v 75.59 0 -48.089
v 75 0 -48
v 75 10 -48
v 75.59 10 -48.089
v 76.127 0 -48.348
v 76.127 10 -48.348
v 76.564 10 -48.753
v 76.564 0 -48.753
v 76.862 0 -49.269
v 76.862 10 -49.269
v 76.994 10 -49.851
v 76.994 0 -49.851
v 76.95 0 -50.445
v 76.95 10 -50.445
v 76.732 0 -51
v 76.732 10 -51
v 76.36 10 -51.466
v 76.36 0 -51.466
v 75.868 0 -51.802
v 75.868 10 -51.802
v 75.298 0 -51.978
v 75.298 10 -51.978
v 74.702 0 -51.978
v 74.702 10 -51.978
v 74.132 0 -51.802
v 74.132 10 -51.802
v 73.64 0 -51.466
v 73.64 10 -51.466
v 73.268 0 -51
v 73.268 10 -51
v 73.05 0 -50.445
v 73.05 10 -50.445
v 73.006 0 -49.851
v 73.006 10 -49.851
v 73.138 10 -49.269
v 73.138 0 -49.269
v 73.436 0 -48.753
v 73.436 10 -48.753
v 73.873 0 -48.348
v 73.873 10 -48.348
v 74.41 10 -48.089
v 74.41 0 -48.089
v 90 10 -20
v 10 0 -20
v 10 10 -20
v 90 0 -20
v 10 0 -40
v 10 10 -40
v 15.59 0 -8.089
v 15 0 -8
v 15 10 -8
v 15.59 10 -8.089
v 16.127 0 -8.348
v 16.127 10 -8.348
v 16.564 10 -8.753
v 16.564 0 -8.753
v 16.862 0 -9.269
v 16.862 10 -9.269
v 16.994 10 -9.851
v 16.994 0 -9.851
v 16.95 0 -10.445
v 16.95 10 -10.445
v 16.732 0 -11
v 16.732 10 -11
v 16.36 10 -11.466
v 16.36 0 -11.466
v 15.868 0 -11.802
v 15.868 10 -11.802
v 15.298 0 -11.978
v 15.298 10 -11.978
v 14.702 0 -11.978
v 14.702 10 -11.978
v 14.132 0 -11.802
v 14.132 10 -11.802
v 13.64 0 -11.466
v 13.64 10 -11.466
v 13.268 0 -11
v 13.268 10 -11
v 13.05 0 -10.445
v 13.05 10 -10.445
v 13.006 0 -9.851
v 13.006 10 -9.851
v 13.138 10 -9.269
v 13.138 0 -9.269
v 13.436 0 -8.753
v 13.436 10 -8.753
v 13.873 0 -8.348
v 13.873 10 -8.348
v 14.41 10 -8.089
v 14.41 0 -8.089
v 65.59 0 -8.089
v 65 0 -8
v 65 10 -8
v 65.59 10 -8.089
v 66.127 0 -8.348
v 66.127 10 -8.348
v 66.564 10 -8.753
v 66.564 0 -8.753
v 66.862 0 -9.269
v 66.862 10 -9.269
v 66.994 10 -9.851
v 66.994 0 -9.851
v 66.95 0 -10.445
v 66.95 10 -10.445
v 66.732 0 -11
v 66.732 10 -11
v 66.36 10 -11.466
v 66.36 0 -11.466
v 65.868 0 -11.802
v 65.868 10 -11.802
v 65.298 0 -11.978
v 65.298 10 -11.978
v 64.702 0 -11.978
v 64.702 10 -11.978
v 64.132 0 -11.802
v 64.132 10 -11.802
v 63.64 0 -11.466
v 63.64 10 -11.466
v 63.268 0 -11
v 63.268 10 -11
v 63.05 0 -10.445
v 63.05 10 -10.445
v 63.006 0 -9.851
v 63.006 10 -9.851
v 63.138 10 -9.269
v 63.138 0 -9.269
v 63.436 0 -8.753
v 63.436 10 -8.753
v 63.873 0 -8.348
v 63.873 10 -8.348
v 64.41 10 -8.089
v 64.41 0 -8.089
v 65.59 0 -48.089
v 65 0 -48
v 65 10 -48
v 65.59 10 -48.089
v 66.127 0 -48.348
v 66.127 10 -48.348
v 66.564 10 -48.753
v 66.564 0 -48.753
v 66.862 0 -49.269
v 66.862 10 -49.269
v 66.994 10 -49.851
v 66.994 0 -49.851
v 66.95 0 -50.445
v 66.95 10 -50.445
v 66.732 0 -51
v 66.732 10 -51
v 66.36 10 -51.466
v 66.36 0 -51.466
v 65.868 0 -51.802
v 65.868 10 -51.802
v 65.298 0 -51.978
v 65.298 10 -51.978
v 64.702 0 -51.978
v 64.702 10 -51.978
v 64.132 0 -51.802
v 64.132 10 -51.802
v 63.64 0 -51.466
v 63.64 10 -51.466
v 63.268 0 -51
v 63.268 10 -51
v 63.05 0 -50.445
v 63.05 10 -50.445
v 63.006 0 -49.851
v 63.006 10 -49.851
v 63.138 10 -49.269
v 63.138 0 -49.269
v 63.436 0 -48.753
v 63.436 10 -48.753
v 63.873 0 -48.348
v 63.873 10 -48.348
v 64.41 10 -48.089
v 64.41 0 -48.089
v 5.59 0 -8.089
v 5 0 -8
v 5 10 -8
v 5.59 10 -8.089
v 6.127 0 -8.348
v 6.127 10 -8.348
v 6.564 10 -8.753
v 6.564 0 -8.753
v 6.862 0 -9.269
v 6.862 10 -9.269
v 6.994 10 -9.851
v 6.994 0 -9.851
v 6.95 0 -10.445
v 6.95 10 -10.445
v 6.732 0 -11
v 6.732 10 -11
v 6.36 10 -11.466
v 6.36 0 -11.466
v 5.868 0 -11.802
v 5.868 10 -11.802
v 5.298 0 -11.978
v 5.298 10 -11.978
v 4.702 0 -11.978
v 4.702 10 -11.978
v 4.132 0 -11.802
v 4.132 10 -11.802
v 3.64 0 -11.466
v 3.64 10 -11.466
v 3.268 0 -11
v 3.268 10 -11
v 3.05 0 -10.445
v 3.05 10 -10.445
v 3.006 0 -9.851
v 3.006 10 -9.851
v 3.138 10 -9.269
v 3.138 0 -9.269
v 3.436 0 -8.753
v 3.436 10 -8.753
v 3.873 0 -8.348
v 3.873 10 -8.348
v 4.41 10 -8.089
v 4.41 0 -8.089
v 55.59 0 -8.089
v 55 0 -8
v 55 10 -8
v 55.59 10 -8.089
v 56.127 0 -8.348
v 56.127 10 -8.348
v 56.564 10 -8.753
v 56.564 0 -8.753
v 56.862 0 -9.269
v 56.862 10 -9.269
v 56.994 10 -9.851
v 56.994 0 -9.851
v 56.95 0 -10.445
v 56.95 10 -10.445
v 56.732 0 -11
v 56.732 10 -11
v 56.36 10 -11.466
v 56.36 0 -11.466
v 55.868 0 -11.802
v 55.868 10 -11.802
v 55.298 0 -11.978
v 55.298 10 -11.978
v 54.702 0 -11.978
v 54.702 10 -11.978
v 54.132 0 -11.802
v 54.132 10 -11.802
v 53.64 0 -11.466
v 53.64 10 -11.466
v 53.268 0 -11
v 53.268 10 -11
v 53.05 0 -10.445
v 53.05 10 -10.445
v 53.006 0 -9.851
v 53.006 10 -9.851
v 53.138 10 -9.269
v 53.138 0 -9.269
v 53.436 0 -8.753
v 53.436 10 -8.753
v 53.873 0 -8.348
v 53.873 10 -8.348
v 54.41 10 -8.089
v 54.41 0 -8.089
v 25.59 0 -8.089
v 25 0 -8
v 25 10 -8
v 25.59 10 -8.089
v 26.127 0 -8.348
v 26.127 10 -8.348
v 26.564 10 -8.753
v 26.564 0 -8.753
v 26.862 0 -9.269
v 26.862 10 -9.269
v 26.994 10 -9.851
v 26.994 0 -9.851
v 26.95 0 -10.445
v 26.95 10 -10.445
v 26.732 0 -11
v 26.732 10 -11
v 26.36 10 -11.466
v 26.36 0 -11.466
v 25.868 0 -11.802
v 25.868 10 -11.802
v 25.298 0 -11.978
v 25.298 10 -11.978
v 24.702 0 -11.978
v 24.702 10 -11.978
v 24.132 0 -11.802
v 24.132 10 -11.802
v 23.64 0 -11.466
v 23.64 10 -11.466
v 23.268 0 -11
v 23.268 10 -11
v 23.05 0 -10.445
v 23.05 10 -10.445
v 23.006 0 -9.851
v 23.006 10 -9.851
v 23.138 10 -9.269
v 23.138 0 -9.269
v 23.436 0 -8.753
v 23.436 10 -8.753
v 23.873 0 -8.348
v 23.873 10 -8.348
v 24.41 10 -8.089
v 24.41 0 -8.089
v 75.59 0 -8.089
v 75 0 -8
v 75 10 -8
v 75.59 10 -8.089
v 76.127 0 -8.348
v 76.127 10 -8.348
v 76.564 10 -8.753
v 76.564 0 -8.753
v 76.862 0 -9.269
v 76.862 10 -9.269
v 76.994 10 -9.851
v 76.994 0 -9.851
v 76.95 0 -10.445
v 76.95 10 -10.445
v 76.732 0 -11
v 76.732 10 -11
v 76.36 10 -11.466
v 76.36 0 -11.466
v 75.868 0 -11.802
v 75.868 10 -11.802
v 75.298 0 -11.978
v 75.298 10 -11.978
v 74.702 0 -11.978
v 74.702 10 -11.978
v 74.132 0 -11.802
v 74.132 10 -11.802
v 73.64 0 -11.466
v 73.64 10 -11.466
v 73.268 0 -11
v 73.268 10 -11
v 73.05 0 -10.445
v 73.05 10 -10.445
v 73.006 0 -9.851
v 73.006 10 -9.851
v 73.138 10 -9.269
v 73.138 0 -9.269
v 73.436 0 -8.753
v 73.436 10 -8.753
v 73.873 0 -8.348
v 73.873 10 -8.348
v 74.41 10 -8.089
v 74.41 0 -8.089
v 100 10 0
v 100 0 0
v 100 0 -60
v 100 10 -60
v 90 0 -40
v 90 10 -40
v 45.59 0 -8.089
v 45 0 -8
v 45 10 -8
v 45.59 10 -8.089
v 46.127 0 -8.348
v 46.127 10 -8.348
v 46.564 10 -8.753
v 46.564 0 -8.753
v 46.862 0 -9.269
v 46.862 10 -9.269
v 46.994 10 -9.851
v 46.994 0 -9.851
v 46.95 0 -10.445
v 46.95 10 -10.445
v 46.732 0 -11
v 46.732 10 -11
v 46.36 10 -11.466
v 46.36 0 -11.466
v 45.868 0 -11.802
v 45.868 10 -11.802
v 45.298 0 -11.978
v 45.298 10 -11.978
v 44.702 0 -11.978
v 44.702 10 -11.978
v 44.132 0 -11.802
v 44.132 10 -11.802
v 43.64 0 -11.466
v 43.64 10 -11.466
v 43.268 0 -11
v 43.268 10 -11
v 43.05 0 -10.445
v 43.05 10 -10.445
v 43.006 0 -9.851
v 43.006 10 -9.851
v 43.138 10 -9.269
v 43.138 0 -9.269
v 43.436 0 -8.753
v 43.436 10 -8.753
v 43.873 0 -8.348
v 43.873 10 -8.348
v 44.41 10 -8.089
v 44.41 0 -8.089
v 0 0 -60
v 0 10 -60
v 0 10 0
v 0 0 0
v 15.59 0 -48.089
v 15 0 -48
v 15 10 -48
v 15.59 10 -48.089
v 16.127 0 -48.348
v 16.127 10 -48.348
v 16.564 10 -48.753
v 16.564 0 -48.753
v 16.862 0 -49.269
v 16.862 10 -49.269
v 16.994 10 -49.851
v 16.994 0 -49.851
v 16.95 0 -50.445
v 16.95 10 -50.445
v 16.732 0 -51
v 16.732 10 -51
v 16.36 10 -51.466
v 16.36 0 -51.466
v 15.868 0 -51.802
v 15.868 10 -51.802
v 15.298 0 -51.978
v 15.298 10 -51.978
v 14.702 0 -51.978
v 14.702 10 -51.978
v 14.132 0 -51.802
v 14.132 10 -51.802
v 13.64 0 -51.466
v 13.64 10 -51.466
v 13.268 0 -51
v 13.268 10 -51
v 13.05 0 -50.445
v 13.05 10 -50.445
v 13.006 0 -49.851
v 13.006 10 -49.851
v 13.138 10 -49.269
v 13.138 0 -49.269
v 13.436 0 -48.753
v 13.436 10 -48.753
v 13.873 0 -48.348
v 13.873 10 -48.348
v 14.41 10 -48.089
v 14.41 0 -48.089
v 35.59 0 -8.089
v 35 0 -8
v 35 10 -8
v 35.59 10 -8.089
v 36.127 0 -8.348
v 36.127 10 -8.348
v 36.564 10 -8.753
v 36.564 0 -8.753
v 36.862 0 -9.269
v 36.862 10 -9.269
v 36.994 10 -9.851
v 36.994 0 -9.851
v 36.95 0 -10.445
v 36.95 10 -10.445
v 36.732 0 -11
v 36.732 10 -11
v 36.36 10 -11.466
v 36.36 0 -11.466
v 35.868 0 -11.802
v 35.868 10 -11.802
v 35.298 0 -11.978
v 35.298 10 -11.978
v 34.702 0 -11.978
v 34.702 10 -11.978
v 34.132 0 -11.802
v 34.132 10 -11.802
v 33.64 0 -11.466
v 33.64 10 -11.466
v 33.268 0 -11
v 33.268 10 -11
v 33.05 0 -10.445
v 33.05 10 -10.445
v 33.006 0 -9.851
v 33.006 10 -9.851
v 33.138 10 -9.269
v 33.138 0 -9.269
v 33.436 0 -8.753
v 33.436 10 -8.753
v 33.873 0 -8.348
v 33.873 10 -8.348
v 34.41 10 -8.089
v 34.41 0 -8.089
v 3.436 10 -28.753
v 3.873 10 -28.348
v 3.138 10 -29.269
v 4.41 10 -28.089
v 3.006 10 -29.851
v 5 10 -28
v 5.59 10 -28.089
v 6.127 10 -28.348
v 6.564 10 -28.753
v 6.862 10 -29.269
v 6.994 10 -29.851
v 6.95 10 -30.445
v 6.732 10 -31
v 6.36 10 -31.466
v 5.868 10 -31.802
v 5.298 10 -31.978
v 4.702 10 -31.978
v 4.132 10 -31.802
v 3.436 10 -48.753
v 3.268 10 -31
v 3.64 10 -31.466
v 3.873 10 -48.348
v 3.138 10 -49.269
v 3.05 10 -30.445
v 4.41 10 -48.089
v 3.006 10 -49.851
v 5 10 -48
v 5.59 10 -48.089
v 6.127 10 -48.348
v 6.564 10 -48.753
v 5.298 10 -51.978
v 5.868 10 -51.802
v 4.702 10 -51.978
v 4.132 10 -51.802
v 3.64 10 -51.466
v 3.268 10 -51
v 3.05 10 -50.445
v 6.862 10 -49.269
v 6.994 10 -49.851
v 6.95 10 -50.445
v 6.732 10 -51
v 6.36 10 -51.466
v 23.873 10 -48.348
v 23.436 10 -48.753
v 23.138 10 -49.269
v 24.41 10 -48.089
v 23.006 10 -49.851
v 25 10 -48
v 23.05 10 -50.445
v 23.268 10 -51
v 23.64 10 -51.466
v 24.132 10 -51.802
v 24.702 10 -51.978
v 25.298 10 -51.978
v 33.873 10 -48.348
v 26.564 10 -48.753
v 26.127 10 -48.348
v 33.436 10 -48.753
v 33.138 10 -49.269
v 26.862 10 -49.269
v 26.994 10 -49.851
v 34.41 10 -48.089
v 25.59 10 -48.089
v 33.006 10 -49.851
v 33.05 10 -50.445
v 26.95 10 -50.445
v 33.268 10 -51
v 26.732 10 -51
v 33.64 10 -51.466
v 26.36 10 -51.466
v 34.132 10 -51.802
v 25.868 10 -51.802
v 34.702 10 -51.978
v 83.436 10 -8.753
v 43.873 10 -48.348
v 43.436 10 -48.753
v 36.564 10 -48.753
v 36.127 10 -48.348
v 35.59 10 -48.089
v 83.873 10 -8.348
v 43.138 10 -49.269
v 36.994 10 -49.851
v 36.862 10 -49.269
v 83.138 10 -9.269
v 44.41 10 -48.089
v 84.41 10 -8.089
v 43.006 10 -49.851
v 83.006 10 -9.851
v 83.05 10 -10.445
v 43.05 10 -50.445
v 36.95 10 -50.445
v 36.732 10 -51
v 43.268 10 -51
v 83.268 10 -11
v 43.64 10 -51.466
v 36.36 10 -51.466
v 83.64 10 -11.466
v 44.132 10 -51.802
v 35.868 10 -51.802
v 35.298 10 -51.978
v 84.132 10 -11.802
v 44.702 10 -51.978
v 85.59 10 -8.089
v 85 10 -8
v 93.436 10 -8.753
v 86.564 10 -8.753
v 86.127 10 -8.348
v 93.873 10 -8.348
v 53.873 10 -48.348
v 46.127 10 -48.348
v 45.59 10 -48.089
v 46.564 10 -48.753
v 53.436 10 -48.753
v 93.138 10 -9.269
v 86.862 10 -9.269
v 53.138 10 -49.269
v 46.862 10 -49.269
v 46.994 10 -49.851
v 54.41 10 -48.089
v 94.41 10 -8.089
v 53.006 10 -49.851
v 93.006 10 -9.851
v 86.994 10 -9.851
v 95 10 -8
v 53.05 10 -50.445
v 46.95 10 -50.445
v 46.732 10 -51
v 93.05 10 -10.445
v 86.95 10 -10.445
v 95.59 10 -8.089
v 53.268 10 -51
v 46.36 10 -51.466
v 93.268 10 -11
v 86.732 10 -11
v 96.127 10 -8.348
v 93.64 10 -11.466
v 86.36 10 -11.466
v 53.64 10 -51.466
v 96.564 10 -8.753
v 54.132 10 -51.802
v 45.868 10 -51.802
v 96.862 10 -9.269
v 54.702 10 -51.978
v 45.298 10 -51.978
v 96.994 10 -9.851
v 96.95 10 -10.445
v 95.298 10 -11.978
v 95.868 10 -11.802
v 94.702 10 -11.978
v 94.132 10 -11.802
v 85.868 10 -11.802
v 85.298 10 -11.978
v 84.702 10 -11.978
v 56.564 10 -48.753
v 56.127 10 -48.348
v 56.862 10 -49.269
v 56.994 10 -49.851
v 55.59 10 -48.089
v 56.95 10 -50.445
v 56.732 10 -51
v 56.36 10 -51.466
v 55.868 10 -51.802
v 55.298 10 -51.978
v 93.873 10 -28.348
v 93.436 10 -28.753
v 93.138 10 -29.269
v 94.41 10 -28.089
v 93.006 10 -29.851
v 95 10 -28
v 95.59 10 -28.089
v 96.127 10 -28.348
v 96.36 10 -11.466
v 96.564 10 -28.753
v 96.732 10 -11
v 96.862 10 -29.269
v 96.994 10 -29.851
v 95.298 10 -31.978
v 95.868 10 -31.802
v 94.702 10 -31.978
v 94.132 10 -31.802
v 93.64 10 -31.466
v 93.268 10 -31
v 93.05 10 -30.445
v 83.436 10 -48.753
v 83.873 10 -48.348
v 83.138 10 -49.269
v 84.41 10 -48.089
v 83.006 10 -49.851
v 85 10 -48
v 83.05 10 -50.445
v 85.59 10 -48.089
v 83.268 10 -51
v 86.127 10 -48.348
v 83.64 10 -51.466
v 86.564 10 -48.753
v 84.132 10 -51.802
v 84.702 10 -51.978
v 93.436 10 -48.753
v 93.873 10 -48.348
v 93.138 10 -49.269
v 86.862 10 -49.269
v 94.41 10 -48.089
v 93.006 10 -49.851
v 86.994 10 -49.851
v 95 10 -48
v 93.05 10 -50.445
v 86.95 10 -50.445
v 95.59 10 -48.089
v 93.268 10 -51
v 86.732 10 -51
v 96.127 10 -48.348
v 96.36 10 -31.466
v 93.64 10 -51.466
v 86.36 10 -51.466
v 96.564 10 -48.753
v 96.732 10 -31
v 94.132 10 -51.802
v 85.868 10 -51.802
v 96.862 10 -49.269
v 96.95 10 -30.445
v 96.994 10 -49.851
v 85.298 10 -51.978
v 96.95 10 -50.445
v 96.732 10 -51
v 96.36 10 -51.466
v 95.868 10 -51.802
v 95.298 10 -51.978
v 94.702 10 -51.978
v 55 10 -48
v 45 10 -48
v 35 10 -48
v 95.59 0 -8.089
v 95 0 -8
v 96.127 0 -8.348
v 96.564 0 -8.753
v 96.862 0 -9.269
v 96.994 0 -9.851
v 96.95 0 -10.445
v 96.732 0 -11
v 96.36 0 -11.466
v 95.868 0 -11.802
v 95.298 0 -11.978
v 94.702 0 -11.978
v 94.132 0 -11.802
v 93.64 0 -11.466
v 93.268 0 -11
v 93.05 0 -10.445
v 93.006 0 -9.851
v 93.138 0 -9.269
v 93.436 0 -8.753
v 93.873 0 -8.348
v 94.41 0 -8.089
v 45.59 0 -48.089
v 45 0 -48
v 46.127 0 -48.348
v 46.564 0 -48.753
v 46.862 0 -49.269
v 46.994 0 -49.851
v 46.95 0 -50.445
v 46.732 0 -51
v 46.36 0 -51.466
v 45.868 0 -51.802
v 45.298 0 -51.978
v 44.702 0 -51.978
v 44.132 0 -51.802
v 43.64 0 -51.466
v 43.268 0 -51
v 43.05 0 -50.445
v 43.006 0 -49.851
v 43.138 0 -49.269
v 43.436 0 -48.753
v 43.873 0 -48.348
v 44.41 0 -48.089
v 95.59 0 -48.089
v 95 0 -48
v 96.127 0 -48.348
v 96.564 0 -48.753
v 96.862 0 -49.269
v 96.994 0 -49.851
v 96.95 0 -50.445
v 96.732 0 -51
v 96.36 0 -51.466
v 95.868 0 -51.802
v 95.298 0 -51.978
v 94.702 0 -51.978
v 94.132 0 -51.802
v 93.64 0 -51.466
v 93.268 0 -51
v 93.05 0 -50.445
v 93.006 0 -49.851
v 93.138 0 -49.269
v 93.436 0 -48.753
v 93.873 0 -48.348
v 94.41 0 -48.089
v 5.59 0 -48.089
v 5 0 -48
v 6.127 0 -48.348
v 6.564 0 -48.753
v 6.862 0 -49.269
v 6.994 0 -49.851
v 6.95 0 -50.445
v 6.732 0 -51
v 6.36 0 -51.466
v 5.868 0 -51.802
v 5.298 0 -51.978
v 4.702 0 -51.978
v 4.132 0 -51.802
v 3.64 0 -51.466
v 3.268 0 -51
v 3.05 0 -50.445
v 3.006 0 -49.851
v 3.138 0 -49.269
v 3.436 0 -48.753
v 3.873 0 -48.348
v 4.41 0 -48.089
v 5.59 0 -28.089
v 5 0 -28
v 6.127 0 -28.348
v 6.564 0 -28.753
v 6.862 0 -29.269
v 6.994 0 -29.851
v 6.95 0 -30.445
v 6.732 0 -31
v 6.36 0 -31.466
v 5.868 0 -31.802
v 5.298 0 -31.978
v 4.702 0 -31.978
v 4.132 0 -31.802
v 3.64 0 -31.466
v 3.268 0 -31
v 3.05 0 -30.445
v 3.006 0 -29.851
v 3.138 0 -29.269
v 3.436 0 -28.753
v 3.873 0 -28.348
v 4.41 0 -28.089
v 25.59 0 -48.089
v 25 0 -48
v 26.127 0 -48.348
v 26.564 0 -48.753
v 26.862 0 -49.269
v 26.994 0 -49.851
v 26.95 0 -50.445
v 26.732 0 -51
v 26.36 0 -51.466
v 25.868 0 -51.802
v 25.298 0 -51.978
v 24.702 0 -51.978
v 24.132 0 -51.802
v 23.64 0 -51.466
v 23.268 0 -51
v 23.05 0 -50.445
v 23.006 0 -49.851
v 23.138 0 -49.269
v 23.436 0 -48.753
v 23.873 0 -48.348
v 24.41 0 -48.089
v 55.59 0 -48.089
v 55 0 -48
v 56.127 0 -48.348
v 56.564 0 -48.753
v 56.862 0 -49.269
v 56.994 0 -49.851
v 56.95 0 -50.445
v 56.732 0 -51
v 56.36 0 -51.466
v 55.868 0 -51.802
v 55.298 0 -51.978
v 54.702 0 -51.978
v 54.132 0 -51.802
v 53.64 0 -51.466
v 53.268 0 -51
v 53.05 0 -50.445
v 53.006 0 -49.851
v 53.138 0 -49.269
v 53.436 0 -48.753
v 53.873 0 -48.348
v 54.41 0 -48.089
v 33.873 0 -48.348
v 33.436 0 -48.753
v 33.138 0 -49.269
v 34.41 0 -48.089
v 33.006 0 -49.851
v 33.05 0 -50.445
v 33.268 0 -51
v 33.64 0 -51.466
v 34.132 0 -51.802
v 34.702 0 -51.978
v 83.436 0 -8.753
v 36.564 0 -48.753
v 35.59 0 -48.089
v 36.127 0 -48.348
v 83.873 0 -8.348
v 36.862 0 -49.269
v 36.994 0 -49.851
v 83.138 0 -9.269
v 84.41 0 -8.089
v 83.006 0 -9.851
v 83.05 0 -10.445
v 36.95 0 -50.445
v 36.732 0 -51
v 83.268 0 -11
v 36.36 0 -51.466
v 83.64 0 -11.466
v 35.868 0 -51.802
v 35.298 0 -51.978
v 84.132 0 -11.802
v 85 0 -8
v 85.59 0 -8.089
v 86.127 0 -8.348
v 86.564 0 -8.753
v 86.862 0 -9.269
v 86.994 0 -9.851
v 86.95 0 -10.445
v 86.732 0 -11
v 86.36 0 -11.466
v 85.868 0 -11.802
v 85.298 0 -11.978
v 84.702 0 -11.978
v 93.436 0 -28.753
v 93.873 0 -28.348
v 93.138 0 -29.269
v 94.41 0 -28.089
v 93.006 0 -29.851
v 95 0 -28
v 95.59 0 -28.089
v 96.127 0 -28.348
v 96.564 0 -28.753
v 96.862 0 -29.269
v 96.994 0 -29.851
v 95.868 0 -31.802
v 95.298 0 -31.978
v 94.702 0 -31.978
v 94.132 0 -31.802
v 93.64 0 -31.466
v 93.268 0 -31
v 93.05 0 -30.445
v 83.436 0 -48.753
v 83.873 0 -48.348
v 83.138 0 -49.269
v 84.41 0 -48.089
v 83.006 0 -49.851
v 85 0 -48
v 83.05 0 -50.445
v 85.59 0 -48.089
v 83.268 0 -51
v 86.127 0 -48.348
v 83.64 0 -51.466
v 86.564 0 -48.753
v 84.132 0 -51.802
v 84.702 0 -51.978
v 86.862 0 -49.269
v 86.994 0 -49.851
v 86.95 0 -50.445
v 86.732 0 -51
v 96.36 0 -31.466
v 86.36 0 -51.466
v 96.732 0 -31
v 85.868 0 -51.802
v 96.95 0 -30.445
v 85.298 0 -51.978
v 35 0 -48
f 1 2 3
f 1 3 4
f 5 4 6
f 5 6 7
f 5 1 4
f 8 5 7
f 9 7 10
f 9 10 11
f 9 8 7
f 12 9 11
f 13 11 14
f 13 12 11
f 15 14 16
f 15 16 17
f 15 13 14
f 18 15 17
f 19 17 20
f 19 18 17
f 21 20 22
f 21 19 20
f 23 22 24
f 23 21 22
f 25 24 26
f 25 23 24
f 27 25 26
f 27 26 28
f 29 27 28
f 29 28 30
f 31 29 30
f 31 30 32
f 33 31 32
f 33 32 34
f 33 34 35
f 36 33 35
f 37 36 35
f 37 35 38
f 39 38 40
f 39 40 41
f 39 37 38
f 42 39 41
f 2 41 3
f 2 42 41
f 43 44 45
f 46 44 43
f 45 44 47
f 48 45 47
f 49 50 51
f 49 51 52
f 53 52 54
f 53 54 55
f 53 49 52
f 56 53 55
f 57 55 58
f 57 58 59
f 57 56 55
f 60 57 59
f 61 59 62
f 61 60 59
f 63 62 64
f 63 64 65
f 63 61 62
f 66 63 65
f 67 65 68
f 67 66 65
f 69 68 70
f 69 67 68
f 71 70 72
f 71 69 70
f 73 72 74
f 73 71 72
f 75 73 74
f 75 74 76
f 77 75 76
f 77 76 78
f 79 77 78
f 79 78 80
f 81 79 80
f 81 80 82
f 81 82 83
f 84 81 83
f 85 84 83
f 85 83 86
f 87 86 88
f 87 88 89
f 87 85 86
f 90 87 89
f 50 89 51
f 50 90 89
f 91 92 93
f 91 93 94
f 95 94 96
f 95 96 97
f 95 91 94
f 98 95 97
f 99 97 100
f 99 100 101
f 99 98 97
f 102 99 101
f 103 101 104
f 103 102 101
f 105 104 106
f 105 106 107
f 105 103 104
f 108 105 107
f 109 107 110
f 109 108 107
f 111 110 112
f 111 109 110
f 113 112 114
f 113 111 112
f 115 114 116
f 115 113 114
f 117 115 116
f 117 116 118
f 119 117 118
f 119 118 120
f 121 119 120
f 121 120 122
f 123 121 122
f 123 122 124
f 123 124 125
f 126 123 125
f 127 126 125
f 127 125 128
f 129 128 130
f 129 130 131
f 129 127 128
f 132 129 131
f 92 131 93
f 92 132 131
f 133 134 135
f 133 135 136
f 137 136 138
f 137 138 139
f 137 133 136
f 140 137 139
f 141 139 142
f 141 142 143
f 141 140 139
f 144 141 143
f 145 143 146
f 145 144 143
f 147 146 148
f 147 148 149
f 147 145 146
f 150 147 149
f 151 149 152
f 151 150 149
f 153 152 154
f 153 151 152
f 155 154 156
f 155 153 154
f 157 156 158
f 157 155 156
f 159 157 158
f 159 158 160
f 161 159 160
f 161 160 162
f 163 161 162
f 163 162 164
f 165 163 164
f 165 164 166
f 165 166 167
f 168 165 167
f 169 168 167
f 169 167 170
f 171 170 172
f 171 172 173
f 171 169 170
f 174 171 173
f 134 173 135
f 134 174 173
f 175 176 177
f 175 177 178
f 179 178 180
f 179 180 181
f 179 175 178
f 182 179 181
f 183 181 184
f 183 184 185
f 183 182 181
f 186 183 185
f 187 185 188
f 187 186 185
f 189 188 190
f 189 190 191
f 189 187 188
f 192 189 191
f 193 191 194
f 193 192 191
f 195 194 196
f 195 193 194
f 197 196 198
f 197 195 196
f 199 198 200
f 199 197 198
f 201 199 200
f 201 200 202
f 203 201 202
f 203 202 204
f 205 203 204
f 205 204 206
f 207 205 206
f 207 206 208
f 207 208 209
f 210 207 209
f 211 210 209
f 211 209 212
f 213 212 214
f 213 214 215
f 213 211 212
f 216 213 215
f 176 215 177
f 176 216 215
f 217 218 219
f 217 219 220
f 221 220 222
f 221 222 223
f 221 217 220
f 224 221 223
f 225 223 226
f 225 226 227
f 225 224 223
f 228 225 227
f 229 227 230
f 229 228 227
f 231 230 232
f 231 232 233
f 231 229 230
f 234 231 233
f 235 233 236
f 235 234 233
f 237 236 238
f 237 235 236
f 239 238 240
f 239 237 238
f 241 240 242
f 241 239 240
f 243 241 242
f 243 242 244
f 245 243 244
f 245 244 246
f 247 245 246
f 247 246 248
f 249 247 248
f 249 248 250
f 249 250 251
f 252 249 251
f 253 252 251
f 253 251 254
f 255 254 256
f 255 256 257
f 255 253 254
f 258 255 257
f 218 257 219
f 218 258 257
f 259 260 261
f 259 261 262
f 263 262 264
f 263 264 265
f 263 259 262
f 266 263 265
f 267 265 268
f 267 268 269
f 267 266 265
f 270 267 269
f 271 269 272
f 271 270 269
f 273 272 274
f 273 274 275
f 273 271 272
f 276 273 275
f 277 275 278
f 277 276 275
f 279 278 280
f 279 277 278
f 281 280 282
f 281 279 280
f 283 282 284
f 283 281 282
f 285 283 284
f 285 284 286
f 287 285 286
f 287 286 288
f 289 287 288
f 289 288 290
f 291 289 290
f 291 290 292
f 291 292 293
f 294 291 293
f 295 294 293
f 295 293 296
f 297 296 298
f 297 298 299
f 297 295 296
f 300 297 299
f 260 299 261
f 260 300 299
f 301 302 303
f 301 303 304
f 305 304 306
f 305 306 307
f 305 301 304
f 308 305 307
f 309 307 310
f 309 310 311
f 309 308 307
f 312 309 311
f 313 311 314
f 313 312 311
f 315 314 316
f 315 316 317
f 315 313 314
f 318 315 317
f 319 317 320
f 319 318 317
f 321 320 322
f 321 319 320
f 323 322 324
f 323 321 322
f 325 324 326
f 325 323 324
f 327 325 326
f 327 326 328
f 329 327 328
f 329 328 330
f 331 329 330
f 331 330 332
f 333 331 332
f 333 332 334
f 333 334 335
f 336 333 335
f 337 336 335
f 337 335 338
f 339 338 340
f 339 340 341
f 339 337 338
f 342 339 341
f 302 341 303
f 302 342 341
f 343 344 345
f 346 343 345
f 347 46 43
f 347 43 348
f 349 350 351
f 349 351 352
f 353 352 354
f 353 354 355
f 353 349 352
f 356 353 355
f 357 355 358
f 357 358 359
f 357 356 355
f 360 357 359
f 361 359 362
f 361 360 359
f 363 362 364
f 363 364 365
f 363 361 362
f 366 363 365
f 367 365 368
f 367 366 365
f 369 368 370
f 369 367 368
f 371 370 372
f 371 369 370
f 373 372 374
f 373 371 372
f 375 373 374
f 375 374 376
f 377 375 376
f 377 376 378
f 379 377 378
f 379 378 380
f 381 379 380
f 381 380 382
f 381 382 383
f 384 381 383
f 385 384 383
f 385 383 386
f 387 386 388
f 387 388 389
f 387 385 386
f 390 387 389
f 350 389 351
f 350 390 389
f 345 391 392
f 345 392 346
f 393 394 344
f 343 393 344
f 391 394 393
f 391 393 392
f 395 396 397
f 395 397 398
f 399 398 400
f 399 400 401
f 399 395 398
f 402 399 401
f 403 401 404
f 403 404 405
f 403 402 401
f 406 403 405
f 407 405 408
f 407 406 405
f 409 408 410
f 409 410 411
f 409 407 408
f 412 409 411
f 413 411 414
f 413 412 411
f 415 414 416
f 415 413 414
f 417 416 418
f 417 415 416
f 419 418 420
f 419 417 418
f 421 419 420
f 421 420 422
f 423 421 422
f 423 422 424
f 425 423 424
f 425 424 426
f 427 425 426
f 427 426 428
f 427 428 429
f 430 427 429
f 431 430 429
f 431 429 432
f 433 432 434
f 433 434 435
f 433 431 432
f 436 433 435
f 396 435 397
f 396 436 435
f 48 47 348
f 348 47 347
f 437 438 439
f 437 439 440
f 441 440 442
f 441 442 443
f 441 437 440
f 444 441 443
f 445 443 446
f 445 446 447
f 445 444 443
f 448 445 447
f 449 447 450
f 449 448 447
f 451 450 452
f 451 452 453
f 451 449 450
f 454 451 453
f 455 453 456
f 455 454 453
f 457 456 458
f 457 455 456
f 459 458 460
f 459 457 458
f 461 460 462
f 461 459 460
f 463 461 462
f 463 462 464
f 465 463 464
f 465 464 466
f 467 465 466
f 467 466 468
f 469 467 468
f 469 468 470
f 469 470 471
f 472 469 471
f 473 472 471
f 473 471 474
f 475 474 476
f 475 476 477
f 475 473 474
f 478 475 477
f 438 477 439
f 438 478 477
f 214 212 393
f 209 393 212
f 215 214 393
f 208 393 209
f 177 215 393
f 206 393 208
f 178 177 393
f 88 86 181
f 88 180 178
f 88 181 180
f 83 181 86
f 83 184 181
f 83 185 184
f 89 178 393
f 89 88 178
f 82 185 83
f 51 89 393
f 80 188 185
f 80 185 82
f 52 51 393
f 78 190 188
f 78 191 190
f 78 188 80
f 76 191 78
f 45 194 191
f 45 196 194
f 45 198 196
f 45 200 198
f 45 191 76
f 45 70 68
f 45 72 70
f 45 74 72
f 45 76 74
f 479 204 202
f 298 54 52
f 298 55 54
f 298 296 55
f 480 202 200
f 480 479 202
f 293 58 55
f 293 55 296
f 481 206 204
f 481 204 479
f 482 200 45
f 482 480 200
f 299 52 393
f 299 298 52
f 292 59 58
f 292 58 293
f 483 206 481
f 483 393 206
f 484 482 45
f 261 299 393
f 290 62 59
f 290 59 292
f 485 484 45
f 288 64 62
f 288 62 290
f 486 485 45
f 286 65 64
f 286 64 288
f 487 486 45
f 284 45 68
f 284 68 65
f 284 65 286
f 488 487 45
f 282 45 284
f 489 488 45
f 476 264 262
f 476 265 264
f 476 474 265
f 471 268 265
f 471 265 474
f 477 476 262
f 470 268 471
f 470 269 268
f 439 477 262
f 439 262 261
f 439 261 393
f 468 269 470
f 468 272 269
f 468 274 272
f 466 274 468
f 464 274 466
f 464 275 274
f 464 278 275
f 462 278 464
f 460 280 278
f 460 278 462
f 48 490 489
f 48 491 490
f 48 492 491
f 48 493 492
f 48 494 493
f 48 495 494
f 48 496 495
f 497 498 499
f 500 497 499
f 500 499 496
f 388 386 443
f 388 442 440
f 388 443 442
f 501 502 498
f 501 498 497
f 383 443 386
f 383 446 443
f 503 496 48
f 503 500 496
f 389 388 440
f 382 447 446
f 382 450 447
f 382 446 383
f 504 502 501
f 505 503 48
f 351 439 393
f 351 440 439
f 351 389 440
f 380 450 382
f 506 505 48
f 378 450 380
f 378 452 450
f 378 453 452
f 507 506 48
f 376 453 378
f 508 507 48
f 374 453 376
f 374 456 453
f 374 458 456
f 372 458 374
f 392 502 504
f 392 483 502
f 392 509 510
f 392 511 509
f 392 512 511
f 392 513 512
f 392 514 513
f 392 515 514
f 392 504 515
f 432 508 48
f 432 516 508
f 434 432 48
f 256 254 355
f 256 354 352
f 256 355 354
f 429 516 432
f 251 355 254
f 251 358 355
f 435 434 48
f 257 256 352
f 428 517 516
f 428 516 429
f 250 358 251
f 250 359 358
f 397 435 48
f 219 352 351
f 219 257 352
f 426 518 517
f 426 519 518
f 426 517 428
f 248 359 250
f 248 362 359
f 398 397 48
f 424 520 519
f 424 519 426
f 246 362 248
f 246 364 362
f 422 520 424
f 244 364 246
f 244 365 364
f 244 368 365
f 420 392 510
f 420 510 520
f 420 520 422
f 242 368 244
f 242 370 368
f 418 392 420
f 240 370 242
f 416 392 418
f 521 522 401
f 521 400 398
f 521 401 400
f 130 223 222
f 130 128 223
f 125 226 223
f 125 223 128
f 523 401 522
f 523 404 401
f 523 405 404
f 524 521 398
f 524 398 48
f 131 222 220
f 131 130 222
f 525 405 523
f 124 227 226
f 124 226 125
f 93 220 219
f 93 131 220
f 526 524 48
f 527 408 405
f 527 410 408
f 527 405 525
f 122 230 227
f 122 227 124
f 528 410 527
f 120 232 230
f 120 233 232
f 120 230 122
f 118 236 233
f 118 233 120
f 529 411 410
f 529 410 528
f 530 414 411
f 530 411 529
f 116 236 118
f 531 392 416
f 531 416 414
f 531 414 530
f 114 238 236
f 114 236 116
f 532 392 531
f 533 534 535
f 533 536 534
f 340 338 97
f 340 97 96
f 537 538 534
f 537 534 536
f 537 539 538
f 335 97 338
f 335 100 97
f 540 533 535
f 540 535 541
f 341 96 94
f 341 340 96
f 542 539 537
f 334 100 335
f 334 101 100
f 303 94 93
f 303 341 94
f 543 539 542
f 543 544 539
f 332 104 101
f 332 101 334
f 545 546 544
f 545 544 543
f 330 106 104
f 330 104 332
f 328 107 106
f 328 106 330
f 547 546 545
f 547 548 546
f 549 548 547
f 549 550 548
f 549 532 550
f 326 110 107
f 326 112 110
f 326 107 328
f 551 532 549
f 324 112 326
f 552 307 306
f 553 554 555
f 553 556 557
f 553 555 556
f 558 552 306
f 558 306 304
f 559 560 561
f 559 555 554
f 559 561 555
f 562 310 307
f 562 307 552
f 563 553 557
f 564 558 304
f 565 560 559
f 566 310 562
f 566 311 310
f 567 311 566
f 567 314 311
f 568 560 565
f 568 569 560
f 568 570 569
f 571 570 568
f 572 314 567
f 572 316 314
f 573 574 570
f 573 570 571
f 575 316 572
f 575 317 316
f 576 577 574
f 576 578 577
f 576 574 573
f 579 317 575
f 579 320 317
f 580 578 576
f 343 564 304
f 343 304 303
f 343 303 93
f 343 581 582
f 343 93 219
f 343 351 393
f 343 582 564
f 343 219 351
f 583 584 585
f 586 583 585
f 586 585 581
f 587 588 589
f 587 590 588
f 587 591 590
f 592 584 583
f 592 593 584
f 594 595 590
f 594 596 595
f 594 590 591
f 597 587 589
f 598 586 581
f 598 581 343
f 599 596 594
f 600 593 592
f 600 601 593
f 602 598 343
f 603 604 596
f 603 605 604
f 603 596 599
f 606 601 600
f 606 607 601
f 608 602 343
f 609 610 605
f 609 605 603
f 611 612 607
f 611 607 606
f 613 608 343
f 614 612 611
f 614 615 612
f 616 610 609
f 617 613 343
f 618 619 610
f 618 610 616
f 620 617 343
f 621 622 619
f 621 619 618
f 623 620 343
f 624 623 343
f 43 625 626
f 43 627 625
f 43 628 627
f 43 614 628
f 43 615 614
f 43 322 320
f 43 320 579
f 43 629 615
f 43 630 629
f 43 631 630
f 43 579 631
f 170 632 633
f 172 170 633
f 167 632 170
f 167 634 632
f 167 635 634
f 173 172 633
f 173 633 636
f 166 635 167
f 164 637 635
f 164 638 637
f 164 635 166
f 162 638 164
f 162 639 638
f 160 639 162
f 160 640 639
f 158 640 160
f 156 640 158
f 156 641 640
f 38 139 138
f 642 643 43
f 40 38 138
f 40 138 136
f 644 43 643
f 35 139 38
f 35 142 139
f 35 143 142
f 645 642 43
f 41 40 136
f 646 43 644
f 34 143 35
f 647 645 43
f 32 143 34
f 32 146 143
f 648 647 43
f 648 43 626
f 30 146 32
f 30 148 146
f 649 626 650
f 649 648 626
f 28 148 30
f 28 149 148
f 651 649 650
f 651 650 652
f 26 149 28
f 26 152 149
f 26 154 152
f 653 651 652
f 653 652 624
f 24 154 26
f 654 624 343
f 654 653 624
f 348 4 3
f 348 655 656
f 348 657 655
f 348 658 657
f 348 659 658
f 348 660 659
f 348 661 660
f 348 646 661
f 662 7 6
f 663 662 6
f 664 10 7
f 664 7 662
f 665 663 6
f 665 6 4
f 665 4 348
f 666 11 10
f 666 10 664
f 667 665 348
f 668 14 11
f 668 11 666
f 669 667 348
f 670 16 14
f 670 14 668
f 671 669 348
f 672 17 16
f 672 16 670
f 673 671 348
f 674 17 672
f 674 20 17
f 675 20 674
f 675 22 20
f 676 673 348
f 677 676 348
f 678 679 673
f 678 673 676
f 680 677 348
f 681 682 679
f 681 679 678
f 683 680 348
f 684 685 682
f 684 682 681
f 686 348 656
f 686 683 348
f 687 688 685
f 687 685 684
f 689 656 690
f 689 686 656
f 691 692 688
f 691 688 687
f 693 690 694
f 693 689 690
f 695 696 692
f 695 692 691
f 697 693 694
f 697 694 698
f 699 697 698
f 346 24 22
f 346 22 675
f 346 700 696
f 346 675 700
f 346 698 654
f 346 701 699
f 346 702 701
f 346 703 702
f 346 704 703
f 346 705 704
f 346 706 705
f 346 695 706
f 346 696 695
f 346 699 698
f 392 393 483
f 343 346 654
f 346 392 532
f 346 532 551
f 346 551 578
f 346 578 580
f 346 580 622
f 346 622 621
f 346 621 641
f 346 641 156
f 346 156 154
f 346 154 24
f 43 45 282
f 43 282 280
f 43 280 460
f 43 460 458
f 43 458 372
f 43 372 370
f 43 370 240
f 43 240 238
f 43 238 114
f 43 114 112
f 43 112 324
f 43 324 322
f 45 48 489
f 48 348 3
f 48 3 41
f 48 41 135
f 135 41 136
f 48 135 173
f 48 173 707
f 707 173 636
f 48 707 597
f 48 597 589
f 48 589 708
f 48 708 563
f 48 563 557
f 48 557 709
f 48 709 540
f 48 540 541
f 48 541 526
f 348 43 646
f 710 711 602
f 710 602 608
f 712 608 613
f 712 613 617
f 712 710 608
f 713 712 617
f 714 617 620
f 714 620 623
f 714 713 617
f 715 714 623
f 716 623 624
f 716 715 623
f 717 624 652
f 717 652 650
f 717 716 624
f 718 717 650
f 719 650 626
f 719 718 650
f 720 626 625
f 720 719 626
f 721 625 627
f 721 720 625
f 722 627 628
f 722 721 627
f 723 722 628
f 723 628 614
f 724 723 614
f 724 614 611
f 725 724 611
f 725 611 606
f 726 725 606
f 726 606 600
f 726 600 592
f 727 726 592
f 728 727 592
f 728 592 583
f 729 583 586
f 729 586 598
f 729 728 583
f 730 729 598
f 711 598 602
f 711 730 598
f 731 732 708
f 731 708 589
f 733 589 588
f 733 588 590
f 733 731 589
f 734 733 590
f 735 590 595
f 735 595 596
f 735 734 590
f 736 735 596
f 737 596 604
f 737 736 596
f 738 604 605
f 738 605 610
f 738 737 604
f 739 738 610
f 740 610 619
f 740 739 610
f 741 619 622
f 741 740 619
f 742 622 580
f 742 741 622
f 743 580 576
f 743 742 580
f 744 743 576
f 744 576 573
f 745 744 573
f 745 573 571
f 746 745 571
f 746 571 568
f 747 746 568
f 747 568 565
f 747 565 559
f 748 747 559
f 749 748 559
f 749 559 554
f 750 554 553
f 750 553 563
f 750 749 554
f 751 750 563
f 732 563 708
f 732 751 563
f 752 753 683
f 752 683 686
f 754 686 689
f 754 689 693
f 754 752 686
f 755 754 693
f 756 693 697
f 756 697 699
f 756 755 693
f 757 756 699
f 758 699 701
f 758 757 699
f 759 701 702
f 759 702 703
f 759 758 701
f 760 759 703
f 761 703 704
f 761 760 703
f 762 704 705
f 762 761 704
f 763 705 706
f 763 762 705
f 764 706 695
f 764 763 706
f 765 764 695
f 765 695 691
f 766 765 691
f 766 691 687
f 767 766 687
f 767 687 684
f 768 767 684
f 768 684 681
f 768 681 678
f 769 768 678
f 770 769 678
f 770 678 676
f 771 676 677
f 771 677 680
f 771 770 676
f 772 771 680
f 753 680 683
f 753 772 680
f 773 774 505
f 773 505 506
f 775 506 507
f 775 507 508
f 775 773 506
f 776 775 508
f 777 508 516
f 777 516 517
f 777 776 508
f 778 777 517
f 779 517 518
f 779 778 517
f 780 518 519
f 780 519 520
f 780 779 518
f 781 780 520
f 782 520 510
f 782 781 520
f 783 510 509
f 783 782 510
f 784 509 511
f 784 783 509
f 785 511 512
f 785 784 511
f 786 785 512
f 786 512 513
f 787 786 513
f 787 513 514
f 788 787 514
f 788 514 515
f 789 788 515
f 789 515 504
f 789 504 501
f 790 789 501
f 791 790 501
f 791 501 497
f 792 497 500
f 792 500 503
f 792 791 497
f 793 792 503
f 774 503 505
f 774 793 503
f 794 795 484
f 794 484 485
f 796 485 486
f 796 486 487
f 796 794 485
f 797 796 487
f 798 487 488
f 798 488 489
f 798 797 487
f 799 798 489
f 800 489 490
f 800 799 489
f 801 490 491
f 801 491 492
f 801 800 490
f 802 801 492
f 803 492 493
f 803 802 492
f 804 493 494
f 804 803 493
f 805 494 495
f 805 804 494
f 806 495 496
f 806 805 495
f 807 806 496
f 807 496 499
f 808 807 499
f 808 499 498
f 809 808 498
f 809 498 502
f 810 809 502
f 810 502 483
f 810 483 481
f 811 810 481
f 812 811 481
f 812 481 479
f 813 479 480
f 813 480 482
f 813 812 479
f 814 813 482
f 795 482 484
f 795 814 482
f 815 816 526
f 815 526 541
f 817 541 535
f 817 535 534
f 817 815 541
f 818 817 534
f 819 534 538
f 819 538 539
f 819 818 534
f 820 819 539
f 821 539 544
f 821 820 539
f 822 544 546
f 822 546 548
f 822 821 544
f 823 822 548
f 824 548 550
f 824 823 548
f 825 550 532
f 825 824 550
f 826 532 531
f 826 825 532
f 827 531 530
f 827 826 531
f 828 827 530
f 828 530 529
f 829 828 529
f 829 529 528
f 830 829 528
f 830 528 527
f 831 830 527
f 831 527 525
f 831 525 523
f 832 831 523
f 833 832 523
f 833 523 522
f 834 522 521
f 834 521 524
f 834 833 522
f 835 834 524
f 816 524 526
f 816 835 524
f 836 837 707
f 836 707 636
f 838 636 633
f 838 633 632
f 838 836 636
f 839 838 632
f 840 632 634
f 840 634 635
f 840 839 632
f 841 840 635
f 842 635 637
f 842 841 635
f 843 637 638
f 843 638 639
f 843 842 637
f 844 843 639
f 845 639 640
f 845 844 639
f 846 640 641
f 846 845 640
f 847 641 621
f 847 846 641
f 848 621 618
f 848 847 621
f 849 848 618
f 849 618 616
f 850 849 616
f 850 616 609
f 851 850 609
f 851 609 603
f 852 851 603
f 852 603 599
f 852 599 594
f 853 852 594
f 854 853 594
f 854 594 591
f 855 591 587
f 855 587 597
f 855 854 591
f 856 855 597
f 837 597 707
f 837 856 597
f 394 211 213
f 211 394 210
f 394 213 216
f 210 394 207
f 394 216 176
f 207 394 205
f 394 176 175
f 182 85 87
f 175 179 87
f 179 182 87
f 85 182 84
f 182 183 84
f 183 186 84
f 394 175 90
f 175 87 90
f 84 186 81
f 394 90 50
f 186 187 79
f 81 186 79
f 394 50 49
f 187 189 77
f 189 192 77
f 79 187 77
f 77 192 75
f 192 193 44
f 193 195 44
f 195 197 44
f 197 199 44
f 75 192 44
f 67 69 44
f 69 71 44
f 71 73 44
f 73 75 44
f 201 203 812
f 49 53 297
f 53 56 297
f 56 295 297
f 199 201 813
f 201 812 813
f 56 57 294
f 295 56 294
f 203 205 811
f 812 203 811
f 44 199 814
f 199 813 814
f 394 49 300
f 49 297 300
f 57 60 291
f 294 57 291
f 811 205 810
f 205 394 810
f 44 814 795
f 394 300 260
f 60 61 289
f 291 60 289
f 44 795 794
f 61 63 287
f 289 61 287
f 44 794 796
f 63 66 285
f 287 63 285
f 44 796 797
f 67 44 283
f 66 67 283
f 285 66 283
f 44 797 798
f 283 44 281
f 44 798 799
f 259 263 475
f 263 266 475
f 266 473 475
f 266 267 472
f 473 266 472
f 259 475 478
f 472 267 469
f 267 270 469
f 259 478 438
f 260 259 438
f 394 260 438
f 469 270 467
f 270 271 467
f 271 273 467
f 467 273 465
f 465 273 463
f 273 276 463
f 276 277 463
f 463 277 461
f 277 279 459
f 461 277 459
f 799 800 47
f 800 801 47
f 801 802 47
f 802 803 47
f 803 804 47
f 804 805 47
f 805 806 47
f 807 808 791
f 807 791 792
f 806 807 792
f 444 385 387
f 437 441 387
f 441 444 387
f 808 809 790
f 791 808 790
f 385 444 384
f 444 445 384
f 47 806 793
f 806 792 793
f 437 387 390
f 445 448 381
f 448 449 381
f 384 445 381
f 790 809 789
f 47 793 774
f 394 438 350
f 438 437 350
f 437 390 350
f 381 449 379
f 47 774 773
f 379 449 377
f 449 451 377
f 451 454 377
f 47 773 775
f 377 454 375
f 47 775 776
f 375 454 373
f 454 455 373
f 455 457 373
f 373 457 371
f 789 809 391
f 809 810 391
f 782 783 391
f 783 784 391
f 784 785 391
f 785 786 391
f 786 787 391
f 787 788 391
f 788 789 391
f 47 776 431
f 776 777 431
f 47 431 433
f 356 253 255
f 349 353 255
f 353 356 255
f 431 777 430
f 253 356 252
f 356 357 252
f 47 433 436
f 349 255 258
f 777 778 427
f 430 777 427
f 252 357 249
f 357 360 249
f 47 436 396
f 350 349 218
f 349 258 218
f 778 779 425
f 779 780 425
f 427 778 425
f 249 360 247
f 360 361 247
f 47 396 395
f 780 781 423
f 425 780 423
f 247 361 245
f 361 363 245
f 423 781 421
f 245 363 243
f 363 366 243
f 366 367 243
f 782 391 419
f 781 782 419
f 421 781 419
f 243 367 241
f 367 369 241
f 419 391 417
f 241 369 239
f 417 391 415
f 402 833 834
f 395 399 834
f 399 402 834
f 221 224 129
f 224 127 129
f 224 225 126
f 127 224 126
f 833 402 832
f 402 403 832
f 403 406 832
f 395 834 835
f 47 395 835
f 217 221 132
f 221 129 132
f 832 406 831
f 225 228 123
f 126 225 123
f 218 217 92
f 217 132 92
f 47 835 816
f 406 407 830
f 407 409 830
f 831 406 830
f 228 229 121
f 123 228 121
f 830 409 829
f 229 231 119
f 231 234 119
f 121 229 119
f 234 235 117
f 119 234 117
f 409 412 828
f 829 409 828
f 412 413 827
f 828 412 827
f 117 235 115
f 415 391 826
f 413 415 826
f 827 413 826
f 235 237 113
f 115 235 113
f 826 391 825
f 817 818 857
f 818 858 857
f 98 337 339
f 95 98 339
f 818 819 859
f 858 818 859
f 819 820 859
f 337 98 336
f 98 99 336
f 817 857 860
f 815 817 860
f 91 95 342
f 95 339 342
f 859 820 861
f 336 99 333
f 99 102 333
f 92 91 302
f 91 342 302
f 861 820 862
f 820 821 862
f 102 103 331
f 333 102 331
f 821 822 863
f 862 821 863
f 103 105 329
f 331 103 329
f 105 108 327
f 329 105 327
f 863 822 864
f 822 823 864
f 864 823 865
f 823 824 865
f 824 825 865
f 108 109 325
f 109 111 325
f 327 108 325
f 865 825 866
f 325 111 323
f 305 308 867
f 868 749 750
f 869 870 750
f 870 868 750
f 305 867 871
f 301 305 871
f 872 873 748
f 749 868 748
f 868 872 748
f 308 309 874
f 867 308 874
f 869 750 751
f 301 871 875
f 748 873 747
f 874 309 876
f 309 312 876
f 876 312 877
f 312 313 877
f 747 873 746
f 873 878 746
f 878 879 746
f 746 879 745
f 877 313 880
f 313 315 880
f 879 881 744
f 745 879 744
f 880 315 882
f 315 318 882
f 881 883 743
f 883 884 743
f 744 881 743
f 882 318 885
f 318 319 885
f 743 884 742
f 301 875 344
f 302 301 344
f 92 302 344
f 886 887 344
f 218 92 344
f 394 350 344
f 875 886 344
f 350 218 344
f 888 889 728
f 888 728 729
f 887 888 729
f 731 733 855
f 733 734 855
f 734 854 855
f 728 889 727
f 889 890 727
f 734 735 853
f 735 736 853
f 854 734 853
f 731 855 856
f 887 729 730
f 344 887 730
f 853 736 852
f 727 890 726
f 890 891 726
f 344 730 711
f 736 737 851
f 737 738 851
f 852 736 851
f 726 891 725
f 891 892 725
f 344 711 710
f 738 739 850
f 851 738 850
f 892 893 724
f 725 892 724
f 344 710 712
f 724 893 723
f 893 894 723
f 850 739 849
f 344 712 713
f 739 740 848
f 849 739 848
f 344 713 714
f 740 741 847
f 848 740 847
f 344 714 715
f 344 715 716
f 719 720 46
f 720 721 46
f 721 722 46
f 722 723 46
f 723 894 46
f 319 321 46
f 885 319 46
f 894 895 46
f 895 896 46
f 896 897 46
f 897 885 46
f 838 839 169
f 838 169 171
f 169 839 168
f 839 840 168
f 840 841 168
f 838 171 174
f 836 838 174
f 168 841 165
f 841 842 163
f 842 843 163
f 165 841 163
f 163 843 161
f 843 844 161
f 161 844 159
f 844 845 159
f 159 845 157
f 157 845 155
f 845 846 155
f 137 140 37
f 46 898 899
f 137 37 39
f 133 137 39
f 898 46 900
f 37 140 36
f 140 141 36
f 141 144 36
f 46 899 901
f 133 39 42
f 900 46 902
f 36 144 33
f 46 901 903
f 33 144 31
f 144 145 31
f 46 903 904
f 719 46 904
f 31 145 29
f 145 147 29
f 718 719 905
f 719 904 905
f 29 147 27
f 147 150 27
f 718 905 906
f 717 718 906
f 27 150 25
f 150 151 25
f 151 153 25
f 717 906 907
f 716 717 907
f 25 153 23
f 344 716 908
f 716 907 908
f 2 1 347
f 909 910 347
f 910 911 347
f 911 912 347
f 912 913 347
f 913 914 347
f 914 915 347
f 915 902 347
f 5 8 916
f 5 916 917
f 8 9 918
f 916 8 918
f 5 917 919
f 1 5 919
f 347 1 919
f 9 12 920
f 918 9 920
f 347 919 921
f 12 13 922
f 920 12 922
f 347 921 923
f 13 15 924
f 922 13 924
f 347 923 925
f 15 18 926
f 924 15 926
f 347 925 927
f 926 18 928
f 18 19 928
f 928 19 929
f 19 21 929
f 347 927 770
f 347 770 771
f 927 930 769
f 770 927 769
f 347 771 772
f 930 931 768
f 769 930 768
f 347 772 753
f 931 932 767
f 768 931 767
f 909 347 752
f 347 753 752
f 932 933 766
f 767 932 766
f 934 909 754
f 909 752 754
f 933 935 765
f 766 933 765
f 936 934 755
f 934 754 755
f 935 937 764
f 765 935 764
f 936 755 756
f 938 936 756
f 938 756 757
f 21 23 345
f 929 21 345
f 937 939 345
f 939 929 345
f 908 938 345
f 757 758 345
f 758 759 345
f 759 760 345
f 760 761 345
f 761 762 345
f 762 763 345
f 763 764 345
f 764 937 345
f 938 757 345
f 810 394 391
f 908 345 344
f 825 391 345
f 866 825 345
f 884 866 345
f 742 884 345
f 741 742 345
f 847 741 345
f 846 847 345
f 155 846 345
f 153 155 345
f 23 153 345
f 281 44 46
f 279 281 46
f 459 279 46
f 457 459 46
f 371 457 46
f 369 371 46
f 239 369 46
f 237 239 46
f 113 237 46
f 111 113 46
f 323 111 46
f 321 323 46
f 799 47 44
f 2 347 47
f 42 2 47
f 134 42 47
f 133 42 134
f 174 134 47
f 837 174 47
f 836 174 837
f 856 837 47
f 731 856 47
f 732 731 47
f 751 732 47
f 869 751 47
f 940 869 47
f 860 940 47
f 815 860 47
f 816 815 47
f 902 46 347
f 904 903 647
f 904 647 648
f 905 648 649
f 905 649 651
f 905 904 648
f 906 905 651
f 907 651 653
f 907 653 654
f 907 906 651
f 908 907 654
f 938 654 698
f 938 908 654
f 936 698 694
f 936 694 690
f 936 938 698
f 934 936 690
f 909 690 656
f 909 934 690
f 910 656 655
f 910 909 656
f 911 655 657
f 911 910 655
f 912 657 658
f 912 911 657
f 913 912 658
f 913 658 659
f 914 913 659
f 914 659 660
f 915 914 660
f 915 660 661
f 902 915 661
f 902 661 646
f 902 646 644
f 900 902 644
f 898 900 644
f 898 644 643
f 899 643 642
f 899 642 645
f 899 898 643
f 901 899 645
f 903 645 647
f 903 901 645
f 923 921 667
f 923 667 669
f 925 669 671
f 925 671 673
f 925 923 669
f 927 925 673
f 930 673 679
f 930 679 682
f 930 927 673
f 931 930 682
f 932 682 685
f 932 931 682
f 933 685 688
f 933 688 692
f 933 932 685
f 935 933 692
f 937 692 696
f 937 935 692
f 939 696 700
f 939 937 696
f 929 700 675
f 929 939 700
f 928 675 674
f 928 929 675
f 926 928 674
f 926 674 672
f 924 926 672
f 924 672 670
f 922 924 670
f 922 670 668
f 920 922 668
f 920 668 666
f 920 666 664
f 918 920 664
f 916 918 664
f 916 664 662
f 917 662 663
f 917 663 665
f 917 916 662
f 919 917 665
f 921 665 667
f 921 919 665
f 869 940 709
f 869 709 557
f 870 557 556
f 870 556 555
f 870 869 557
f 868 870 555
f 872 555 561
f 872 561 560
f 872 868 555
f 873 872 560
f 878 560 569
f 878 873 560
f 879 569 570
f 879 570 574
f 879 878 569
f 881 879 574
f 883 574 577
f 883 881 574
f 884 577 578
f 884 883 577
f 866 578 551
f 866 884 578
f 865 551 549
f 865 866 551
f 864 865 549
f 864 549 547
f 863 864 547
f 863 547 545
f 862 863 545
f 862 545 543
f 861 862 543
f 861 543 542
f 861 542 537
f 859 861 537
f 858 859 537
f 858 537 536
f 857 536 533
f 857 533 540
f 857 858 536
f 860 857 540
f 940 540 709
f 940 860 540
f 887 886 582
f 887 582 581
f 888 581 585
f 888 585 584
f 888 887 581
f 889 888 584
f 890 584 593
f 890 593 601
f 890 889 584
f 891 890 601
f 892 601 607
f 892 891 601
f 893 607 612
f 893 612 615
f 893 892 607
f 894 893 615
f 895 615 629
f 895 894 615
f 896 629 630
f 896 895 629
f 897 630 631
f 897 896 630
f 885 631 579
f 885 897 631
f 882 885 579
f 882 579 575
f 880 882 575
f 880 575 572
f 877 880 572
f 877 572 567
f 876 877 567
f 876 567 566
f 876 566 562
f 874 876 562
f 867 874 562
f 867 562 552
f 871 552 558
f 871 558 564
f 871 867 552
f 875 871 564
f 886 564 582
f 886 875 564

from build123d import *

# Parameters (mm, degrees)
SKETCH1_W           = 100
SKETCH1_H           = 60
SKETCH1_R           = 2
SKETCH1_W_2         = 80
SKETCH1_H_2         = 20
BOSS_EXTRUDE1_DEPTH = 10


with BuildPart() as part:
    # Sketch1 → Boss-Extrude1 (new body)
    with BuildSketch(Plane(origin=(0, 0, 0), x_dir=(1, 0, 0), z_dir=(0, 1, 0))):
        with Locations((50, 30)):
            Rectangle(SKETCH1_W, SKETCH1_H)
        with Locations(Location((5, 30, 0), (0, 0, 270))):
            Circle(SKETCH1_R, mode=Mode.SUBTRACT)
        with Locations(Location((5, 50, 0), (0, 0, 270))):
            Circle(SKETCH1_R, mode=Mode.SUBTRACT)
        with Locations(Location((5, 10, 0), (0, 0, 270))):
            Circle(SKETCH1_R, mode=Mode.SUBTRACT)
        with Locations(Location((15, 50, 0), (0, 0, 270))):
            Circle(SKETCH1_R, mode=Mode.SUBTRACT)
        with Locations(Location((15, 10, 0), (0, 0, 270))):
            Circle(SKETCH1_R, mode=Mode.SUBTRACT)
        with Locations(Location((25, 50, 0), (0, 0, 270))):
            Circle(SKETCH1_R, mode=Mode.SUBTRACT)
        with Locations(Location((25, 10, 0), (0, 0, 270))):
            Circle(SKETCH1_R, mode=Mode.SUBTRACT)
        with Locations(Location((35, 50, 0), (0, 0, 270))):
            Circle(SKETCH1_R, mode=Mode.SUBTRACT)
        with Locations(Location((35, 10, 0), (0, 0, 270))):
            Circle(SKETCH1_R, mode=Mode.SUBTRACT)
        with Locations(Location((45, 50, 0), (0, 0, 270))):
            Circle(SKETCH1_R, mode=Mode.SUBTRACT)
        with Locations(Location((45, 10, 0), (0, 0, 270))):
            Circle(SKETCH1_R, mode=Mode.SUBTRACT)
        with Locations(Location((55, 50, 0), (0, 0, 270))):
            Circle(SKETCH1_R, mode=Mode.SUBTRACT)
        with Locations(Location((55, 10, 0), (0, 0, 270))):
            Circle(SKETCH1_R, mode=Mode.SUBTRACT)
        with Locations(Location((65, 50, 0), (0, 0, 270))):
            Circle(SKETCH1_R, mode=Mode.SUBTRACT)
        with Locations(Location((65, 10, 0), (0, 0, 270))):
            Circle(SKETCH1_R, mode=Mode.SUBTRACT)
        with Locations(Location((75, 50, 0), (0, 0, 270))):
            Circle(SKETCH1_R, mode=Mode.SUBTRACT)
        with Locations(Location((75, 10, 0), (0, 0, 270))):
            Circle(SKETCH1_R, mode=Mode.SUBTRACT)
        with Locations(Location((85, 50, 0), (0, 0, 270))):
            Circle(SKETCH1_R, mode=Mode.SUBTRACT)
        with Locations(Location((85, 10, 0), (0, 0, 270))):
            Circle(SKETCH1_R, mode=Mode.SUBTRACT)
        with Locations(Location((95, 50, 0), (0, 0, 270))):
            Circle(SKETCH1_R, mode=Mode.SUBTRACT)
        with Locations(Location((95, 10, 0), (0, 0, 270))):
            Circle(SKETCH1_R, mode=Mode.SUBTRACT)
        with Locations(Location((95, 30, 0), (0, 0, 270))):
            Circle(SKETCH1_R, mode=Mode.SUBTRACT)
        with Locations((50, 30)):
            Rectangle(SKETCH1_W_2, SKETCH1_H_2, mode=Mode.SUBTRACT)
    extrude(amount=BOSS_EXTRUDE1_DEPTH)


solid = part.part
